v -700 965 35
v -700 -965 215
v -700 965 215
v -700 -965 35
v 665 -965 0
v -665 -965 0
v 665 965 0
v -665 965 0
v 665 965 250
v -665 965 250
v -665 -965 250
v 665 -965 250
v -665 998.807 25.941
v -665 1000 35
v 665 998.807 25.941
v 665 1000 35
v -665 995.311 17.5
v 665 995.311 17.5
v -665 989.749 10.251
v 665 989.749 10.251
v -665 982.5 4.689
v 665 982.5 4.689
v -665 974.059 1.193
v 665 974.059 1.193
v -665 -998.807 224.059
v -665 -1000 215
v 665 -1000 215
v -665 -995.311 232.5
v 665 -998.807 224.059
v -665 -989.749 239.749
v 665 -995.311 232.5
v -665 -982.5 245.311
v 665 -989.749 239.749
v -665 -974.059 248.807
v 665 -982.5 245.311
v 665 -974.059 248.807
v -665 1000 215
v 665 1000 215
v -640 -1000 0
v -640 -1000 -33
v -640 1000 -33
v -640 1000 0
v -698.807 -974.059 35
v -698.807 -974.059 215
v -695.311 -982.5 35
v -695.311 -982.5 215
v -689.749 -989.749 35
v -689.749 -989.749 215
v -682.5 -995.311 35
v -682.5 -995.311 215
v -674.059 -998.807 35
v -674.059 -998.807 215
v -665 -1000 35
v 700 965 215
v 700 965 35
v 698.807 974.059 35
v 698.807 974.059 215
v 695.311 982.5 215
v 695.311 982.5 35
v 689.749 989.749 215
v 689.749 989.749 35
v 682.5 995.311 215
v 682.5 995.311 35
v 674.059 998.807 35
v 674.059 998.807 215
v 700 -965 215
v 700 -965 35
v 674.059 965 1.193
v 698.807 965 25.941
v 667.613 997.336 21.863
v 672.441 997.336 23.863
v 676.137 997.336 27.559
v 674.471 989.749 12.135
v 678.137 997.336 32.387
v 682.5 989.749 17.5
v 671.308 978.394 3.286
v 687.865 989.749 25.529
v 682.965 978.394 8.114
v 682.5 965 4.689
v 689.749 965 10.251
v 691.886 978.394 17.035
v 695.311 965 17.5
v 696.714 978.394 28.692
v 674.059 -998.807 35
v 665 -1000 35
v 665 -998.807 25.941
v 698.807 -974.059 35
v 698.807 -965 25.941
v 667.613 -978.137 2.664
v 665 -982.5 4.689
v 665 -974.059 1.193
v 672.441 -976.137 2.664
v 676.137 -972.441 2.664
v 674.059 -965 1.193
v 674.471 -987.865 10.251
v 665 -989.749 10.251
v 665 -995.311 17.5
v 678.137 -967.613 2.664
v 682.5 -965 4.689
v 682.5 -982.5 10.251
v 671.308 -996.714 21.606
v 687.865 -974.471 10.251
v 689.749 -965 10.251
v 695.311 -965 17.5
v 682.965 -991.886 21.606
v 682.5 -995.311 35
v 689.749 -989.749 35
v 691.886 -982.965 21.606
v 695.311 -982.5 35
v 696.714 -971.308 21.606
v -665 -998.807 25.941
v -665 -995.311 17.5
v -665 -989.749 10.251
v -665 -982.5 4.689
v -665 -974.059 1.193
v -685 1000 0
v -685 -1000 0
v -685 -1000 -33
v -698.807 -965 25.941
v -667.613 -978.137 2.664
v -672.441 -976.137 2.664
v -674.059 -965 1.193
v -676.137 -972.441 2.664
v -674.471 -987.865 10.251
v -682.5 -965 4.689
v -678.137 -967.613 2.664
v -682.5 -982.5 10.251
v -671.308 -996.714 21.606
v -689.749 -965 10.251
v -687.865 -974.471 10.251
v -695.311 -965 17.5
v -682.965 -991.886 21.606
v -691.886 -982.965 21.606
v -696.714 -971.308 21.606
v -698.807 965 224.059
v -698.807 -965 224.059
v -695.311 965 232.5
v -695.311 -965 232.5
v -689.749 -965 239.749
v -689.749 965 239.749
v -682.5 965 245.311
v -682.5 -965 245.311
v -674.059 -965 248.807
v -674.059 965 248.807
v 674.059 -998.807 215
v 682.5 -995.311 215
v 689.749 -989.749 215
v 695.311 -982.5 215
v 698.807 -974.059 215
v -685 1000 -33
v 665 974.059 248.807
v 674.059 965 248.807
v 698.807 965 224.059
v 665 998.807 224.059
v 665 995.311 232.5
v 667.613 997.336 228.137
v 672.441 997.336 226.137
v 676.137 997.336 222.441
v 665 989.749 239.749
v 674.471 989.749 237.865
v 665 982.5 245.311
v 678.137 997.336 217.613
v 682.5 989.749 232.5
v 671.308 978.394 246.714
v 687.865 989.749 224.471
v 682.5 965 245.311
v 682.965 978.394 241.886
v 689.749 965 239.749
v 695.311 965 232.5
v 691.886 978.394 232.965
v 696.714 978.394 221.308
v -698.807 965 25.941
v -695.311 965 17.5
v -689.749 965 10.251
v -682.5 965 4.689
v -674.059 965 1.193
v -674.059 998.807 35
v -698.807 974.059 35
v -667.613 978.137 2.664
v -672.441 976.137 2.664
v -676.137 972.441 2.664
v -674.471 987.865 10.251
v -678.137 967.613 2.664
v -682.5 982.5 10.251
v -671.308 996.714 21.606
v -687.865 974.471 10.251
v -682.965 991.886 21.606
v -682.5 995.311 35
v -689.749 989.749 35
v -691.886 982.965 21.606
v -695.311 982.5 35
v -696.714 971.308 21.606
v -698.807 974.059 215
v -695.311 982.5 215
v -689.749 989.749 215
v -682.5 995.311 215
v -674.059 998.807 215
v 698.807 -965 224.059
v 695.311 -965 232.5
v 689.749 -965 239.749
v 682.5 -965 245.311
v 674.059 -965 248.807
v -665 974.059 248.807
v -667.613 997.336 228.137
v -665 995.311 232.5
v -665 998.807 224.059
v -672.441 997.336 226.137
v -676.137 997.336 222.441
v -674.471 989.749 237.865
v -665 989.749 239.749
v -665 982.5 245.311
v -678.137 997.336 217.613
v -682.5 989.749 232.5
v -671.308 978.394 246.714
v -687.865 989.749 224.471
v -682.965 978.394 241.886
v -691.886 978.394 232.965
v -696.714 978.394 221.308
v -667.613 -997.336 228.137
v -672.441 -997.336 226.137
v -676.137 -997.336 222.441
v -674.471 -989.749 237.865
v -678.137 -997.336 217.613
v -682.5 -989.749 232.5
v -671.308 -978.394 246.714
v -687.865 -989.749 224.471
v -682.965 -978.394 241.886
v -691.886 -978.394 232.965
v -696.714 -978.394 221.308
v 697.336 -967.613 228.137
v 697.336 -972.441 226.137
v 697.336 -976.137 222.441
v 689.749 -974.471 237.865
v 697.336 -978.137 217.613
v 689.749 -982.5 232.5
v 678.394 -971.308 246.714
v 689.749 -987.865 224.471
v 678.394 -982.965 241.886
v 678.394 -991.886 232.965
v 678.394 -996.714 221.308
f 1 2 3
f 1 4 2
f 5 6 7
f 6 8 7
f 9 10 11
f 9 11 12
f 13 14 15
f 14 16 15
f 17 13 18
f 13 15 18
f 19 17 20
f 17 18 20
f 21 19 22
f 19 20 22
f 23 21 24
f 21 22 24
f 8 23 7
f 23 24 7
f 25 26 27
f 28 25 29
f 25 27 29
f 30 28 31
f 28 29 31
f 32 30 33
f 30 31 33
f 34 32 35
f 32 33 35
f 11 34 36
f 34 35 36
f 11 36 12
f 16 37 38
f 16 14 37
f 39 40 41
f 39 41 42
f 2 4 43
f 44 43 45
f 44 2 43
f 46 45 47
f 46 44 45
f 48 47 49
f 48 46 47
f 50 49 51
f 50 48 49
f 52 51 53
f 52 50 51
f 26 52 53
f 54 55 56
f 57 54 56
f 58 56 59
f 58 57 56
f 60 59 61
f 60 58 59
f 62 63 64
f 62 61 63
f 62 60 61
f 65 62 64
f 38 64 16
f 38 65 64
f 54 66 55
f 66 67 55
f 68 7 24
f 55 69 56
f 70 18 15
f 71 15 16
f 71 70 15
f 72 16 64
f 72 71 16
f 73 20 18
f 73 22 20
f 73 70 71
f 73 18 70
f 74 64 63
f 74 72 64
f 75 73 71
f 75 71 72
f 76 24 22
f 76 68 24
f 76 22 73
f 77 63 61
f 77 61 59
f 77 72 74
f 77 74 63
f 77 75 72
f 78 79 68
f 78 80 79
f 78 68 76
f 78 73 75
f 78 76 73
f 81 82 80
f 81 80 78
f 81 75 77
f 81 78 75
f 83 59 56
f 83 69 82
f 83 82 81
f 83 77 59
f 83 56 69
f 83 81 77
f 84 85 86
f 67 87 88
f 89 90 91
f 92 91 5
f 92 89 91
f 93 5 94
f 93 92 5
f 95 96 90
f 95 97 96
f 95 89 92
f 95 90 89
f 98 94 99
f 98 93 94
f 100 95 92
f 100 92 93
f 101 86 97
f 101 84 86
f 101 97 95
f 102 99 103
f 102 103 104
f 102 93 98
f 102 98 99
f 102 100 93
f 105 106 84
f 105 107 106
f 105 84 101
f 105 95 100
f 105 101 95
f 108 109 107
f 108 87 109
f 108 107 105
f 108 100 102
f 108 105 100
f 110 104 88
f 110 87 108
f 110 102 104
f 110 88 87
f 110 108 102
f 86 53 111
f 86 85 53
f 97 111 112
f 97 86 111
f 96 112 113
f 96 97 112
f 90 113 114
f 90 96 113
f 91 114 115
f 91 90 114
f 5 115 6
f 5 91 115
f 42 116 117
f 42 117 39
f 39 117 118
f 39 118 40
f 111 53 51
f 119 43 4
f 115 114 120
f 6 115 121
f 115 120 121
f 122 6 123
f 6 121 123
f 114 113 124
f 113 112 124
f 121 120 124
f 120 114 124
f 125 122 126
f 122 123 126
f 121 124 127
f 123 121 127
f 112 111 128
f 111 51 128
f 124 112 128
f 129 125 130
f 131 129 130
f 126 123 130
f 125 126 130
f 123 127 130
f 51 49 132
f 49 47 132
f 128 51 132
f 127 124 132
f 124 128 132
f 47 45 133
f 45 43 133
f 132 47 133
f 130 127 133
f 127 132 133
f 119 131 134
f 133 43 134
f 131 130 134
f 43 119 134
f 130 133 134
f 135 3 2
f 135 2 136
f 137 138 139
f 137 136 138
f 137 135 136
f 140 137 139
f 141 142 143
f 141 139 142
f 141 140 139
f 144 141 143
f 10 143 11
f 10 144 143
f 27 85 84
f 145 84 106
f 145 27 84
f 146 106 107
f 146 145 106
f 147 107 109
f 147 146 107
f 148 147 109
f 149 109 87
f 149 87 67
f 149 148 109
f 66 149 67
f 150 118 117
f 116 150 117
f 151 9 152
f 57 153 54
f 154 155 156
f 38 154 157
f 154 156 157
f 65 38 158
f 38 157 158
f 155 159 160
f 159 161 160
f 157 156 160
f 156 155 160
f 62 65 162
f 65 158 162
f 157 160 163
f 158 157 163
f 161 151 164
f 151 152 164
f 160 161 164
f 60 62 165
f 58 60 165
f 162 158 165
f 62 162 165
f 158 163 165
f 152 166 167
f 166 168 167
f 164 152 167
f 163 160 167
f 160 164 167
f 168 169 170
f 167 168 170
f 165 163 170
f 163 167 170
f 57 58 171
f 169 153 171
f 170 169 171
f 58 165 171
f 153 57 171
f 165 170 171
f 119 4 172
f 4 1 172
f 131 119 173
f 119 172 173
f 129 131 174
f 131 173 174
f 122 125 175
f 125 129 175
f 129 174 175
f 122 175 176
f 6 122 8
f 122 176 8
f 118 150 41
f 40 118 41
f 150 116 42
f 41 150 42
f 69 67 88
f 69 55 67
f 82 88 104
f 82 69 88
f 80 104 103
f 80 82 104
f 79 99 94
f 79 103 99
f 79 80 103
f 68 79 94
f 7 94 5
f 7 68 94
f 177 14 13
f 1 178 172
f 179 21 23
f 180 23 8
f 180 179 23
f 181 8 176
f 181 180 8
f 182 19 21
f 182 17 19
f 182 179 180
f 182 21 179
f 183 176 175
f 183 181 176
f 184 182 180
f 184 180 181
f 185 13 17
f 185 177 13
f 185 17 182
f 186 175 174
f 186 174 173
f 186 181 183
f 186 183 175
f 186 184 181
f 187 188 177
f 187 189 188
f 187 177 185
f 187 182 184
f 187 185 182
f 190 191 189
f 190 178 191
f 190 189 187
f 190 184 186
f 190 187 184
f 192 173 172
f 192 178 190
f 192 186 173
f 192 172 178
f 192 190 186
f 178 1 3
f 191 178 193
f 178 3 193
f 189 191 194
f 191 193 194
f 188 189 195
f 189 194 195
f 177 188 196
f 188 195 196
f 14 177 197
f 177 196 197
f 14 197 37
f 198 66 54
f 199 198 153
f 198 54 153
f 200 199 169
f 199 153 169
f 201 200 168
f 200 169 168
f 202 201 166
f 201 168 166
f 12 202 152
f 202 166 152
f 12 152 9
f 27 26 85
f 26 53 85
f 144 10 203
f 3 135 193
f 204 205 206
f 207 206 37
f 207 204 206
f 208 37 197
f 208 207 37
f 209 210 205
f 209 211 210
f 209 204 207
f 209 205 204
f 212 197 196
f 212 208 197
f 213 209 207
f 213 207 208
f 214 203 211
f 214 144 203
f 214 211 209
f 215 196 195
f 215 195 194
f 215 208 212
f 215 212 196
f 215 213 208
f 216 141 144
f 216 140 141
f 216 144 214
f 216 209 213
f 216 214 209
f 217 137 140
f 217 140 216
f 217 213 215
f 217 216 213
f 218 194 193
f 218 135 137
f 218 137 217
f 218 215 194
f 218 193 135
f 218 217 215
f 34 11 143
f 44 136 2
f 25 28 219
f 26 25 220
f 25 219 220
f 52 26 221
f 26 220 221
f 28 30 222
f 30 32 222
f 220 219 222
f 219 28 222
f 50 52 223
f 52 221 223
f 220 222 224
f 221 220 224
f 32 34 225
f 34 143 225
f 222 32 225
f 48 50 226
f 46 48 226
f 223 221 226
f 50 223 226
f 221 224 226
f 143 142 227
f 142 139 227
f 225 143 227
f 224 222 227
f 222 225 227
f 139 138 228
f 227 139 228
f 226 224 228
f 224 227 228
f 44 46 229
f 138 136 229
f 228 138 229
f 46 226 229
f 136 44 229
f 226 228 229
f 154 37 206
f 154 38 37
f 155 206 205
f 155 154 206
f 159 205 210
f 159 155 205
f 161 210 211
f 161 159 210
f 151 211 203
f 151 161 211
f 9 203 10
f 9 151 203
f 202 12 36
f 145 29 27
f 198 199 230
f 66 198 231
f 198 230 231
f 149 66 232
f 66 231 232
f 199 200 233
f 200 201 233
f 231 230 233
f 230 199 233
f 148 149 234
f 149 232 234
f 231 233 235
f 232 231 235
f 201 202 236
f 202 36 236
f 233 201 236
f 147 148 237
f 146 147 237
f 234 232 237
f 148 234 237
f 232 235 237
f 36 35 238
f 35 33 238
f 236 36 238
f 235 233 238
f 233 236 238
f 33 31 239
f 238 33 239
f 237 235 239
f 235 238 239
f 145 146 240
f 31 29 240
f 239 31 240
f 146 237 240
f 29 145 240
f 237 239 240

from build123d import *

# Parameters (mm, degrees)
F0_W     = 1400
F0_H     = 2000
F1_DEPTH = 250
F2_R     = 35
F3_W     = 45
F3_H     = 33
F4_DEPTH = 1000


with BuildPart() as f1:
    # F0 (on Top) → F1 (new body)
    with BuildSketch(Plane.XY):
        Rectangle(F0_W, F0_H)
    extrude(amount=F1_DEPTH)

    # F2
    f2_edges = [f1.edges().sort_by_distance(p)[0] for p in [
        (-700, 0, 250),
        (0, -1000, 250),
        (-700, -1000, 125),
        (700, 0, 250),
        (0, 1000, 250),
        (700, -1000, 125),
        (0, -1000, 0),
        (700, 0, 0),
        (-700, 1000, 125),
        (0, 1000, 0),
        (700, 1000, 125),
        (-700, 0, 0),
    ]]
    fillet(f2_edges, radius=F2_R)


with BuildPart() as f4:
    # F3 (on Front) → F4 (new body, symmetric)
    with BuildSketch(Plane.XZ):
        with Locations((-662.5, -16.5)):
            Rectangle(F3_W, F3_H)
    extrude(amount=F4_DEPTH, both=True)


solid = Compound([f1.part, f4.part])
